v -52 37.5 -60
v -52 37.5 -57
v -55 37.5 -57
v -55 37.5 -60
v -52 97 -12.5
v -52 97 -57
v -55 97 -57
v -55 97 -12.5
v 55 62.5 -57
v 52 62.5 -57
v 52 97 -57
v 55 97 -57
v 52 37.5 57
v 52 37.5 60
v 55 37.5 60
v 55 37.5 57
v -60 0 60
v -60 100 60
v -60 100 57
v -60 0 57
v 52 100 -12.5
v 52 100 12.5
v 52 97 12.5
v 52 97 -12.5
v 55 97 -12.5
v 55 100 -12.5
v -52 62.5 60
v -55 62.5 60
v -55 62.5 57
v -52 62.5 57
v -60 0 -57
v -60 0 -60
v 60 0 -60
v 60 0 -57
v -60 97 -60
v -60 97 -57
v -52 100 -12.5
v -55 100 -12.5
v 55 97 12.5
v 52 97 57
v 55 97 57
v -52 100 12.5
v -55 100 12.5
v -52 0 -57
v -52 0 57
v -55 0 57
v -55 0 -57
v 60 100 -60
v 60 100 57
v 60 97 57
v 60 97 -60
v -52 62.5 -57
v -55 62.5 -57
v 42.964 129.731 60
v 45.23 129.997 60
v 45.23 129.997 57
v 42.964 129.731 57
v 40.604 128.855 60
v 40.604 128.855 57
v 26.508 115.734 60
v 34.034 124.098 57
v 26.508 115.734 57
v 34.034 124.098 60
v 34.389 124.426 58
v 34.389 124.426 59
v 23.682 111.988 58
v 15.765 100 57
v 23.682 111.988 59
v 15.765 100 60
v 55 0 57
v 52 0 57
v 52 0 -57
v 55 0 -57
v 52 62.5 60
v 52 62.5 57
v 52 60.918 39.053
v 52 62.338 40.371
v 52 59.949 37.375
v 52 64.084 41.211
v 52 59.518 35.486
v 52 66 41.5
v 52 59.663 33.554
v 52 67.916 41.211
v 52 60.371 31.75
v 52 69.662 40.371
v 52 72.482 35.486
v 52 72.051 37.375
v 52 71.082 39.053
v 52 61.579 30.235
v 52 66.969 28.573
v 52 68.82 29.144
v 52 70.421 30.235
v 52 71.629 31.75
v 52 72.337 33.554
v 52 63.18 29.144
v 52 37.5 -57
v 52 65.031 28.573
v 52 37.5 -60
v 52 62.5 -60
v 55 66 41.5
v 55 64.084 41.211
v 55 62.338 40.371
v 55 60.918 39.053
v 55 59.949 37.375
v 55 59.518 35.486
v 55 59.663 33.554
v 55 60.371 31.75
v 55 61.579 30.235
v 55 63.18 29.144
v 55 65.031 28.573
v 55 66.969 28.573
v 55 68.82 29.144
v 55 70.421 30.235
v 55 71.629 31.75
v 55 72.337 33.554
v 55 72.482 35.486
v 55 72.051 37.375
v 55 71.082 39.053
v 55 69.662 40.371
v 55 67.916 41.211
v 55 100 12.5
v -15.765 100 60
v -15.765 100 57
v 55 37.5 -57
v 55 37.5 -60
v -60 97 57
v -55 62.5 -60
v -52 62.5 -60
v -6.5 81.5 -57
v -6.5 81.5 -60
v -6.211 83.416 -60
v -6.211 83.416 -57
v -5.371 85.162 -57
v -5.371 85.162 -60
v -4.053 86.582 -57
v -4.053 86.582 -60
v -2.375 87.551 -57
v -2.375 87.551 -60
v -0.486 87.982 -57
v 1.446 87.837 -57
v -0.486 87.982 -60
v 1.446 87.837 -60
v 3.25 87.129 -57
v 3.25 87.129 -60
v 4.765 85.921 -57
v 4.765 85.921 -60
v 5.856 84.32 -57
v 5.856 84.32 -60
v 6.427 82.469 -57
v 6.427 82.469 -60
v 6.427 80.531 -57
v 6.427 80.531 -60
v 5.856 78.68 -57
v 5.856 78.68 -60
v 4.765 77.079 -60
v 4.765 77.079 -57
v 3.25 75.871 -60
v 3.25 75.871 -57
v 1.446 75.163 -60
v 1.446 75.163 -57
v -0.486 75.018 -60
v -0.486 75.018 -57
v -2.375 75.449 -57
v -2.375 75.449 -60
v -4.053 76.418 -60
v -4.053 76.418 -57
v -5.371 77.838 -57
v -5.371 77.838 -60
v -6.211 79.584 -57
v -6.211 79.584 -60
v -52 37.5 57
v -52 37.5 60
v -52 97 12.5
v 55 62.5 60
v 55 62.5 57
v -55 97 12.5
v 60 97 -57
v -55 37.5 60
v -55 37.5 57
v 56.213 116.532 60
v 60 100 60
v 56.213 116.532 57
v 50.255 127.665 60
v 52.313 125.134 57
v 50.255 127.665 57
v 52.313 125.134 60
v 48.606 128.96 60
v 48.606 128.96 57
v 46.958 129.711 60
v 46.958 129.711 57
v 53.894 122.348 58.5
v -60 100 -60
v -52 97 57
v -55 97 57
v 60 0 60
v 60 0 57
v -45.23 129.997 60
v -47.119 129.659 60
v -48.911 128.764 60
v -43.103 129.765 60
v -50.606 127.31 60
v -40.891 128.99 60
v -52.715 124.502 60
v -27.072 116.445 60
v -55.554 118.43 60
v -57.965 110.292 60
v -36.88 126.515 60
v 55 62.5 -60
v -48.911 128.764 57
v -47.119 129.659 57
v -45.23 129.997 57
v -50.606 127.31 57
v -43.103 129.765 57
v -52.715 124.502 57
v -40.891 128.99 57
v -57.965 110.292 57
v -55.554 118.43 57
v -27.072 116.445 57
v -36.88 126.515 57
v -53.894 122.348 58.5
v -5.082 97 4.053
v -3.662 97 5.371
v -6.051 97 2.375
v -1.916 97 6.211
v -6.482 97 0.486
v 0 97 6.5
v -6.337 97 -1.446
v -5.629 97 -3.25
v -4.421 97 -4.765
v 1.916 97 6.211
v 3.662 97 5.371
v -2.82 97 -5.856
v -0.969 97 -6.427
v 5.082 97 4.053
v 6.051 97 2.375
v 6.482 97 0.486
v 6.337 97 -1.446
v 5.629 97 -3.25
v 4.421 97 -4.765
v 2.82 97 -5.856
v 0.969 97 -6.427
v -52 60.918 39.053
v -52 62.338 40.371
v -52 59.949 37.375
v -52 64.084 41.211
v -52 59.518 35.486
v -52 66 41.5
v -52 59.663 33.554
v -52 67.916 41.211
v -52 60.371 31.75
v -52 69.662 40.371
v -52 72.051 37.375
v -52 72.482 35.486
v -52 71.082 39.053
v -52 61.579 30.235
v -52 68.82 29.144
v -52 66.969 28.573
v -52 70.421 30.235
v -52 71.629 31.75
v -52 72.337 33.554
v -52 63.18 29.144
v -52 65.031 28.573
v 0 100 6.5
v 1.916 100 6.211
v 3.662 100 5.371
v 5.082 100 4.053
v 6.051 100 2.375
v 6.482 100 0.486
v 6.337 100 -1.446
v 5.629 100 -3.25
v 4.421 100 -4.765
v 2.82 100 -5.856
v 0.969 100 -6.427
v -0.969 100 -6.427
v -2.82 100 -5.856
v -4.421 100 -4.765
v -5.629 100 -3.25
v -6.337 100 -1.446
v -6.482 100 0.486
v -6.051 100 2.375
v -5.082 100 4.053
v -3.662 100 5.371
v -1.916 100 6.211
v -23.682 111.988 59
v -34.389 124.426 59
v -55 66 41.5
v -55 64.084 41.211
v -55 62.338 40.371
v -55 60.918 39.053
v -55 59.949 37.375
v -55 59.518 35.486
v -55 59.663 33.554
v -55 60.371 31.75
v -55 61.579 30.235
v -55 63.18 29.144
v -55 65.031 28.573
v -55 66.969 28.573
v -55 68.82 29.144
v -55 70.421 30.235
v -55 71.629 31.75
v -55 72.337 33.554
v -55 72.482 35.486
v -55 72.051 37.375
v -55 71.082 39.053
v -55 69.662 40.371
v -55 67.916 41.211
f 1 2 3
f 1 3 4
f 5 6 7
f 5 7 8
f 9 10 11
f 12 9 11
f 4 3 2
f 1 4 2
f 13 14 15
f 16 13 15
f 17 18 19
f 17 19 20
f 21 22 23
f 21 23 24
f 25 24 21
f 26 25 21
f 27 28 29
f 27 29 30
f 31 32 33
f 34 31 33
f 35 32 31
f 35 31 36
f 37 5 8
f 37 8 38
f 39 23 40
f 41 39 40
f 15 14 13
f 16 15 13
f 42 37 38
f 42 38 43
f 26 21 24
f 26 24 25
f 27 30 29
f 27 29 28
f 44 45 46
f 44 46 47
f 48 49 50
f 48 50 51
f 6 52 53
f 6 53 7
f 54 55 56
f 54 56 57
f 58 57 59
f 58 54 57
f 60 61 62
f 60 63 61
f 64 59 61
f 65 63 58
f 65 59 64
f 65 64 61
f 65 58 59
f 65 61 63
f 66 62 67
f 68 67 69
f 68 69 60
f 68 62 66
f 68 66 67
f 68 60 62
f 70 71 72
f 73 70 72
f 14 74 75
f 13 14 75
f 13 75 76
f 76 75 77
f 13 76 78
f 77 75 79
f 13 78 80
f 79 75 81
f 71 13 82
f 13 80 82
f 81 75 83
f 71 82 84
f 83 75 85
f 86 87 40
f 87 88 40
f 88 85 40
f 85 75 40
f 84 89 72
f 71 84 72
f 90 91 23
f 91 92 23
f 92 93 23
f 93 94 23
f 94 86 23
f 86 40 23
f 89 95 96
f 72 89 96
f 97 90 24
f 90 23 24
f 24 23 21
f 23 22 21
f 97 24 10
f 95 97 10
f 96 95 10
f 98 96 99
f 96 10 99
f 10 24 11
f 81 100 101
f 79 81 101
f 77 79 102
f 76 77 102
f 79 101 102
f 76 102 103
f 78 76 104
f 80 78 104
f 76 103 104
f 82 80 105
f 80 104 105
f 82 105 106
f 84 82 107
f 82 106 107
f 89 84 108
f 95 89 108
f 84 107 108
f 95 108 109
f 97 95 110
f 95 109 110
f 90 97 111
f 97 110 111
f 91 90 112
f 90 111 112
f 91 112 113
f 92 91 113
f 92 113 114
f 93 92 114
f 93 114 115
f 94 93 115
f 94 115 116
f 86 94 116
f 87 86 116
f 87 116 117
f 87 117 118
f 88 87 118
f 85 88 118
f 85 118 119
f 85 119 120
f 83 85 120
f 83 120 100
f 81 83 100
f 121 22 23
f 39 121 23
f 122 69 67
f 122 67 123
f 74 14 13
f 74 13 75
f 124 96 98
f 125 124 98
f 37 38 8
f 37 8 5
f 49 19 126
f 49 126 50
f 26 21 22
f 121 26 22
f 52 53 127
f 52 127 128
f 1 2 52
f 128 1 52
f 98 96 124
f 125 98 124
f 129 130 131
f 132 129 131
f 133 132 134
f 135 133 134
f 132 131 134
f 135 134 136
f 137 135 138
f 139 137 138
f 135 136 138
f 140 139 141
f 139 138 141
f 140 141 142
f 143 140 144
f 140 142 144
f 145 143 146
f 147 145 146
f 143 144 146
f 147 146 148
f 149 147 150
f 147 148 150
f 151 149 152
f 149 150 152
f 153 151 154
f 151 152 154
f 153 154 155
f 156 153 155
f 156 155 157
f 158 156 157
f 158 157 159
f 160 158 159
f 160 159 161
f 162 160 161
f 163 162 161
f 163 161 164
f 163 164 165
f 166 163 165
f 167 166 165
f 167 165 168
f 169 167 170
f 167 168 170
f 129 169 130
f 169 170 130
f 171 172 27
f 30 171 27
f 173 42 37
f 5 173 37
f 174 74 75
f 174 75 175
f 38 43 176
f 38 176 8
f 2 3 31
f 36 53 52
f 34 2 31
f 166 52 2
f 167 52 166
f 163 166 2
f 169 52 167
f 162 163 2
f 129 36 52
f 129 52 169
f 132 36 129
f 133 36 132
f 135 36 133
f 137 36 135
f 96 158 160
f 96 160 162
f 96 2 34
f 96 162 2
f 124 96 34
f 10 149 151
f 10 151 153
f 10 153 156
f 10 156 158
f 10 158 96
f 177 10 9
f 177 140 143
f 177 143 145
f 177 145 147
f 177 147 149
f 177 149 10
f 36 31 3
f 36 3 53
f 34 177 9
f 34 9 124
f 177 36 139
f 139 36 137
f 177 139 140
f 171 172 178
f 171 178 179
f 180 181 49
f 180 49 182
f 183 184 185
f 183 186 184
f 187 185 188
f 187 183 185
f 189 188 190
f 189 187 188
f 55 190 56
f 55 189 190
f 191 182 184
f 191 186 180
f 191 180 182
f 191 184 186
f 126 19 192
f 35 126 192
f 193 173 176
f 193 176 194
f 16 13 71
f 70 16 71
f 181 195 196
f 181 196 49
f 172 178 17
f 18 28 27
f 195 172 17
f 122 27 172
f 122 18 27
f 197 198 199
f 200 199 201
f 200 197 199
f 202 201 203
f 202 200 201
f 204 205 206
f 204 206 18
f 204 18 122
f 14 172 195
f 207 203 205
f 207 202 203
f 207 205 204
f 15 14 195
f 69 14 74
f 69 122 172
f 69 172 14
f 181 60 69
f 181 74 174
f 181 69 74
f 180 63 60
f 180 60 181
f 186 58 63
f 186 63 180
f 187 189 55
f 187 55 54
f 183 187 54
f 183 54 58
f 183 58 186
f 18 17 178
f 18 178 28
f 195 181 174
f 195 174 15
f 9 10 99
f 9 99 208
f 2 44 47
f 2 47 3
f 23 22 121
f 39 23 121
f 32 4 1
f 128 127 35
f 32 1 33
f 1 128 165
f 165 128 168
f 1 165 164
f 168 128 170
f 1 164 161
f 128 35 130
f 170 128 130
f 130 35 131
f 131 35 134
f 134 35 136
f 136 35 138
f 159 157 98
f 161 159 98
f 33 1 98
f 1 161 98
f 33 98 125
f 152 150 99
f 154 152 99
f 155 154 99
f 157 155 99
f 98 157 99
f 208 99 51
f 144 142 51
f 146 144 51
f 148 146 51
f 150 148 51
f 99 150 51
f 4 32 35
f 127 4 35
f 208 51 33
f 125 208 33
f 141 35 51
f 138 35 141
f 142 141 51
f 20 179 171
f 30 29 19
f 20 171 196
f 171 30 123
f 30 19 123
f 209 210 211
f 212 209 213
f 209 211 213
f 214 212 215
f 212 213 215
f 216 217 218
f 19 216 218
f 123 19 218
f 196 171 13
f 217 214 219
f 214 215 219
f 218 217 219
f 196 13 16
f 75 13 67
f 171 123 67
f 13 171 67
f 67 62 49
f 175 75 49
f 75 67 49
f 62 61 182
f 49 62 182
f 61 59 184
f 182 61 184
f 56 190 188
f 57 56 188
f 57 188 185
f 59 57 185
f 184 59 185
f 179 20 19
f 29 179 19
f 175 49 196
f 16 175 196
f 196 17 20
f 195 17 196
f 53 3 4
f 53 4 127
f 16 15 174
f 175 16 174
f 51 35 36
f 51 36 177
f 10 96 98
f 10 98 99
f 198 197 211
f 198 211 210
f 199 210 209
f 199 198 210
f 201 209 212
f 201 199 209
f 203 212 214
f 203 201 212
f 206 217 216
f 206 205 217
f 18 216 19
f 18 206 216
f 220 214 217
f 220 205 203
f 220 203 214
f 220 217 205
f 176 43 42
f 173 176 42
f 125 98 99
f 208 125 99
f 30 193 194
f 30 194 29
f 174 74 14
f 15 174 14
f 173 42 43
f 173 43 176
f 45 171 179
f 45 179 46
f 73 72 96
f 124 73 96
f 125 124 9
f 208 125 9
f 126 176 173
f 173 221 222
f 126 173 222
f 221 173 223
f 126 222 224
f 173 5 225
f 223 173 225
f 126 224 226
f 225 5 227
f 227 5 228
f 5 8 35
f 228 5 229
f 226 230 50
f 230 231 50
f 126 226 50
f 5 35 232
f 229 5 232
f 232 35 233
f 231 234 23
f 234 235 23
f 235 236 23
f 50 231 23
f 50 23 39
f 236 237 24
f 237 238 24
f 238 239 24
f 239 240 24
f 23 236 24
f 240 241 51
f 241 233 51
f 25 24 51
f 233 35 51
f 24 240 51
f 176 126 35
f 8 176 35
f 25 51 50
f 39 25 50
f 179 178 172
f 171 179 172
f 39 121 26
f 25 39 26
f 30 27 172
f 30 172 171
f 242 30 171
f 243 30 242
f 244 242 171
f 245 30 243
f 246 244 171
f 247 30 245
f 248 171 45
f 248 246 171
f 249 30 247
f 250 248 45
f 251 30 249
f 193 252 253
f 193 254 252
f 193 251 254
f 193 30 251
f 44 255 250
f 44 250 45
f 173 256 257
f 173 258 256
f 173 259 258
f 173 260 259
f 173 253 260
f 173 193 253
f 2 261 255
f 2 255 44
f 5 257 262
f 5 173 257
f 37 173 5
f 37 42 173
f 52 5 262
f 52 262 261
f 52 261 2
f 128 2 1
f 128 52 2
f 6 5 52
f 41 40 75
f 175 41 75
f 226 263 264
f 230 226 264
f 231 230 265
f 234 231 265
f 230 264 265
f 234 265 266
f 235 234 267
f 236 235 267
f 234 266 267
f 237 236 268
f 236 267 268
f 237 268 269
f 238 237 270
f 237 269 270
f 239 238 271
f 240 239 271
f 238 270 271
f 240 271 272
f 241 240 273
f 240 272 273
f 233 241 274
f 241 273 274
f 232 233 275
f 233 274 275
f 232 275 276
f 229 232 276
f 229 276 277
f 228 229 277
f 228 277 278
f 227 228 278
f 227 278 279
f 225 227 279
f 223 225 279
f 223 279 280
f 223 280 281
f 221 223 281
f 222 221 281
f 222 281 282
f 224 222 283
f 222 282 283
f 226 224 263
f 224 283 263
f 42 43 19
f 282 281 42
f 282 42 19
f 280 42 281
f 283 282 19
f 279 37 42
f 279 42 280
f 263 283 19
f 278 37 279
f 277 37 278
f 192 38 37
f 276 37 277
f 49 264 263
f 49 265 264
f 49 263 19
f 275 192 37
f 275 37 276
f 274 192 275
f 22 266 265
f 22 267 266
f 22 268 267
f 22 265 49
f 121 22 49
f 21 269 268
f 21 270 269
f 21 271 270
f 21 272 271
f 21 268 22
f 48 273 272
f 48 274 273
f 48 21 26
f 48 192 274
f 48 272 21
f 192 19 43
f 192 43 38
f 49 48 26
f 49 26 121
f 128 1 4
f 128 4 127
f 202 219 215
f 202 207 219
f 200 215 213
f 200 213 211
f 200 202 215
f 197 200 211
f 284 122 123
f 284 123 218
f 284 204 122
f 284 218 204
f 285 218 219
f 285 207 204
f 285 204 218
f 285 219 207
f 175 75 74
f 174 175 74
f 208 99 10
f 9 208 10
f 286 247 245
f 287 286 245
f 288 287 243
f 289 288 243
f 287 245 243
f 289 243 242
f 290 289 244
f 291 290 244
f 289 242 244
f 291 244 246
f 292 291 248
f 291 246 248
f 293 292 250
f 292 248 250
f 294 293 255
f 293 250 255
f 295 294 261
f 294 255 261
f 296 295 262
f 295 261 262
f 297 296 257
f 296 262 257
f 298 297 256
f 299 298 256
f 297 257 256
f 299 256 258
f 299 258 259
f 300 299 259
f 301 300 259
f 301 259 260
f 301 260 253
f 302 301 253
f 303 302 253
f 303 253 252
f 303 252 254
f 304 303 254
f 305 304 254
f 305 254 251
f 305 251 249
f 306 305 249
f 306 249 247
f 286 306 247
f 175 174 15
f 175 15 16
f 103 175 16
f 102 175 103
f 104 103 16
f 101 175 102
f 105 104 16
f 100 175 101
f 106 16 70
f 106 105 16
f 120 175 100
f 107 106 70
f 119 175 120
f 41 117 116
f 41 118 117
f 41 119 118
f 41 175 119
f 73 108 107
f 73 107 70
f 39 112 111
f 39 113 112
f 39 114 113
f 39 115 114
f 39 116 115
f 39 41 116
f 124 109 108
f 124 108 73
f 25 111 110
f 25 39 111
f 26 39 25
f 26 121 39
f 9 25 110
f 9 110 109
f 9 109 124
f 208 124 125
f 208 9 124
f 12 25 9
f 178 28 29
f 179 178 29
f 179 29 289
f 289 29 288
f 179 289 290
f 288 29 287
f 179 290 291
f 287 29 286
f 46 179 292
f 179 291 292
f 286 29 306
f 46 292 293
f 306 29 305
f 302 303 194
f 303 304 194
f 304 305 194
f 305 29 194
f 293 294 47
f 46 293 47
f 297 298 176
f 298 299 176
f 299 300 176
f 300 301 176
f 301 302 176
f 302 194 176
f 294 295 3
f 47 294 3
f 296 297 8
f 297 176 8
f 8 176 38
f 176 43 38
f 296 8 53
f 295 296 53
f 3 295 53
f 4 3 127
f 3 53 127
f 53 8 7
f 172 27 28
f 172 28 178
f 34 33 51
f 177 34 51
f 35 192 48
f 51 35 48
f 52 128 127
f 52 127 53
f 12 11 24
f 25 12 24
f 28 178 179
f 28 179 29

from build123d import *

# Parameters (mm, degrees)
SALIENTE_EXTRUIR1_START = 60
SALIENTE_EXTRUIR1_DEPTH = 3
SALIENTE_EXTRUIR2_START = -60
CROQUIS2_W              = 120
CROQUIS2_H              = 100
SALIENTE_EXTRUIR2_DEPTH = 3
SALIENTE_EXTRUIR3_START = -8
SALIENTE_EXTRUIR3_DEPTH = 3
CROQUIS4_W              = 119.999849
CROQUIS4_H              = 117
SALIENTE_EXTRUIR4_DEPTH = 3
CROQUIS5_W              = 3
CROQUIS5_H              = 25
CORTAR_EXTRUIR1_DEPTH   = 187.815418903
MOVER_CARA1_BY          = 3
CROQUIS7_W              = 3
CROQUIS7_H              = 25
CORTAR_EXTRUIR2_DEPTH   = 132.14880797
CROQUIS8_R              = 6.5
CORTAR_EXTRUIR3_DEPTH   = 3
CROQUIS9_R              = 6.5
CORTAR_EXTRUIR4_DEPTH   = 184.643678769
CROQUIS10_R             = 6.5
CORTAR_EXTRUIR5_DEPTH   = 3


# Read off the part's stored shape, not the designer's step: Saliente-Extruir3
with BuildPart() as part:
    # Model → Saliente-Extruir1 (new body)
    with BuildSketch(Plane.XY.offset(SALIENTE_EXTRUIR1_START)):
        with BuildLine():
            Line((15.764688, 100.00011), (-15.764828, 100.00011))
            add(Edge.make_bspline(
                [(-15.764828, 100.00011), (-21.400806, 109.325085), (-35.208529, 130.297372), (-45.229888, 129.996806)],
                knots=[0, 0, 0, 0, 1, 1, 1, 1], degree=3))
            add(Edge.make_bspline(
                [(-45.229888, 129.996806), (-55.17293, 129.698356), (-59.999989, 100.00011)],
                knots=[0, 0, 0, 1, 1, 1], degree=2))
            Line((-59.999989, 100.00011), (-59.999989, -4.9e-05))
            Line((-59.999989, -4.9e-05), (59.999849, -4.9e-05))
            Line((59.999849, -4.9e-05), (59.999849, 100.00011))
            add(Edge.make_bspline(
                [(59.999849, 100.00011), (55.17279, 129.698356), (45.229748, 129.996806)],
                knots=[0, 0, 0, 1, 1, 1], degree=2))
            add(Edge.make_bspline(
                [(45.229748, 129.996806), (35.208389, 130.297372), (21.401019, 109.325085), (15.764688, 100.00011)],
                knots=[0, 0, 0, 0, 1, 1, 1, 1], degree=3))
        make_face()
    extrude(amount=-SALIENTE_EXTRUIR1_DEPTH)


with BuildPart() as body_2:
    # Croquis2 → Saliente-Extruir2 (new body)
    with BuildSketch(Plane.XY.offset(SALIENTE_EXTRUIR2_START)):
        with Locations((0, 50)):
            Rectangle(CROQUIS2_W, CROQUIS2_H)
    extrude(amount=SALIENTE_EXTRUIR2_DEPTH)


with BuildPart() as body_3:
    # Saliente-Extruir3 outline → Saliente-Extruir3 (new body)
    with BuildSketch(Plane(origin=(60, 0, 0), x_dir=(0, 0, -1), z_dir=(1, 0, 0)).offset(SALIENTE_EXTRUIR3_START)):
        Polygon((-57, 62.4999755), (-60, 62.4999755), (-60, 37.4999755), (-57, 37.4999755), (-57, -4.9e-05), (57, -4.9e-05), (57, 37.4999755), (60, 37.4999755), (60, 62.4999755), (57, 62.4999755), (57, 97), (12.5, 97), (12.5, 100), (-12.5, 100), (-12.5, 97), (-57, 97), align=None)
    extrude(amount=SALIENTE_EXTRUIR3_DEPTH)


with BuildPart() as body_4:
    # Simetría2: mirrored copy
    add(body_3.part.mirror(Plane(origin=(0, 0, 0), x_dir=(0, 0, 1), z_dir=(1, 0, 0))))


with BuildPart() as body_5:
    # Croquis4 → Saliente-Extruir4 (new body)
    with BuildSketch(Plane(origin=(0, 100, 0), x_dir=(1, 0, 0), z_dir=(0, 1, 0))):
        with Locations((-7.55e-05, 1.5)):
            Rectangle(CROQUIS4_W, CROQUIS4_H)
    extrude(amount=-SALIENTE_EXTRUIR4_DEPTH)

    # Croquis7 → Cortar-Extruir2 (cut, through all)
    with BuildSketch(Plane(origin=(0, 100, 0), x_dir=(1, 0, 0), z_dir=(0, 1, 0))):
        with Locations((-53.5, 0)):
            Rectangle(CROQUIS7_W, CROQUIS7_H)
        with Locations((53.5, 0)):
            Rectangle(CROQUIS7_W, CROQUIS7_H)
    extrude(amount=-CORTAR_EXTRUIR2_DEPTH, mode=Mode.SUBTRACT)

    # Croquis10 → Cortar-Extruir5 (cut)
    with BuildSketch(Plane(origin=(0, 100, 0), x_dir=(1, 0, 0), z_dir=(0, 1, 0))):
        with Locations(Location((0, 0, 0), (0, 0, 270))):
            Circle(CROQUIS10_R)
    extrude(amount=-CORTAR_EXTRUIR5_DEPTH, mode=Mode.SUBTRACT)


with BuildPart() as cortar_extruir1_tool:
    # Croquis5 → Cortar-Extruir1 (new, through all)
    with BuildSketch(Plane.XY.offset(60)):
        with Locations((-53.5, 49.9999755)):
            Rectangle(CROQUIS5_W, CROQUIS5_H)
        with Locations((53.5, 49.9999755)):
            Rectangle(CROQUIS5_W, CROQUIS5_H)
    extrude(amount=-CORTAR_EXTRUIR1_DEPTH)


with BuildPart() as part_1:
    add(part.part)

    # Cortar-Extruir1: cut by cortar_extruir1_tool
    add(cortar_extruir1_tool.part, mode=Mode.SUBTRACT)


with BuildPart() as body_2_1:
    add(body_2.part)

    # Cortar-Extruir1: cut by cortar_extruir1_tool
    add(cortar_extruir1_tool.part, mode=Mode.SUBTRACT)

    # Mover cara1: a face moved inward by 3.0
    extrude(body_2_1.faces().sort_by_distance((0, 100, -58.5))[0], amount=MOVER_CARA1_BY, dir=(0, -1, 0), mode=Mode.SUBTRACT)

    # Croquis8 → Cortar-Extruir3 (cut)
    with BuildSketch(Plane(origin=(0, 0, -60), x_dir=(-1, 0, 0), z_dir=(0, 0, -1))):
        with Locations((0, 81.5)):
            Circle(CROQUIS8_R)
    extrude(amount=-CORTAR_EXTRUIR3_DEPTH, mode=Mode.SUBTRACT)


with BuildPart() as cortar_extruir4_tool:
    # Croquis9 → Cortar-Extruir4 (new, through all)
    with BuildSketch(Plane(origin=(55, 0, 0), x_dir=(0, 0, -1), z_dir=(1, 0, 0))):
        with Locations(Location((-35, 66, 0), (0, 0, 180))):
            Circle(CROQUIS9_R)
    extrude(amount=-CORTAR_EXTRUIR4_DEPTH)


with BuildPart() as body_3_1:
    add(body_3.part)

    # Cortar-Extruir4: cut by cortar_extruir4_tool
    add(cortar_extruir4_tool.part, mode=Mode.SUBTRACT)


with BuildPart() as body_4_1:
    add(body_4.part)

    # Cortar-Extruir4: cut by cortar_extruir4_tool
    add(cortar_extruir4_tool.part, mode=Mode.SUBTRACT)


solid = Compound([body_5.part, part_1.part, body_2_1.part, body_3_1.part, body_4_1.part])
